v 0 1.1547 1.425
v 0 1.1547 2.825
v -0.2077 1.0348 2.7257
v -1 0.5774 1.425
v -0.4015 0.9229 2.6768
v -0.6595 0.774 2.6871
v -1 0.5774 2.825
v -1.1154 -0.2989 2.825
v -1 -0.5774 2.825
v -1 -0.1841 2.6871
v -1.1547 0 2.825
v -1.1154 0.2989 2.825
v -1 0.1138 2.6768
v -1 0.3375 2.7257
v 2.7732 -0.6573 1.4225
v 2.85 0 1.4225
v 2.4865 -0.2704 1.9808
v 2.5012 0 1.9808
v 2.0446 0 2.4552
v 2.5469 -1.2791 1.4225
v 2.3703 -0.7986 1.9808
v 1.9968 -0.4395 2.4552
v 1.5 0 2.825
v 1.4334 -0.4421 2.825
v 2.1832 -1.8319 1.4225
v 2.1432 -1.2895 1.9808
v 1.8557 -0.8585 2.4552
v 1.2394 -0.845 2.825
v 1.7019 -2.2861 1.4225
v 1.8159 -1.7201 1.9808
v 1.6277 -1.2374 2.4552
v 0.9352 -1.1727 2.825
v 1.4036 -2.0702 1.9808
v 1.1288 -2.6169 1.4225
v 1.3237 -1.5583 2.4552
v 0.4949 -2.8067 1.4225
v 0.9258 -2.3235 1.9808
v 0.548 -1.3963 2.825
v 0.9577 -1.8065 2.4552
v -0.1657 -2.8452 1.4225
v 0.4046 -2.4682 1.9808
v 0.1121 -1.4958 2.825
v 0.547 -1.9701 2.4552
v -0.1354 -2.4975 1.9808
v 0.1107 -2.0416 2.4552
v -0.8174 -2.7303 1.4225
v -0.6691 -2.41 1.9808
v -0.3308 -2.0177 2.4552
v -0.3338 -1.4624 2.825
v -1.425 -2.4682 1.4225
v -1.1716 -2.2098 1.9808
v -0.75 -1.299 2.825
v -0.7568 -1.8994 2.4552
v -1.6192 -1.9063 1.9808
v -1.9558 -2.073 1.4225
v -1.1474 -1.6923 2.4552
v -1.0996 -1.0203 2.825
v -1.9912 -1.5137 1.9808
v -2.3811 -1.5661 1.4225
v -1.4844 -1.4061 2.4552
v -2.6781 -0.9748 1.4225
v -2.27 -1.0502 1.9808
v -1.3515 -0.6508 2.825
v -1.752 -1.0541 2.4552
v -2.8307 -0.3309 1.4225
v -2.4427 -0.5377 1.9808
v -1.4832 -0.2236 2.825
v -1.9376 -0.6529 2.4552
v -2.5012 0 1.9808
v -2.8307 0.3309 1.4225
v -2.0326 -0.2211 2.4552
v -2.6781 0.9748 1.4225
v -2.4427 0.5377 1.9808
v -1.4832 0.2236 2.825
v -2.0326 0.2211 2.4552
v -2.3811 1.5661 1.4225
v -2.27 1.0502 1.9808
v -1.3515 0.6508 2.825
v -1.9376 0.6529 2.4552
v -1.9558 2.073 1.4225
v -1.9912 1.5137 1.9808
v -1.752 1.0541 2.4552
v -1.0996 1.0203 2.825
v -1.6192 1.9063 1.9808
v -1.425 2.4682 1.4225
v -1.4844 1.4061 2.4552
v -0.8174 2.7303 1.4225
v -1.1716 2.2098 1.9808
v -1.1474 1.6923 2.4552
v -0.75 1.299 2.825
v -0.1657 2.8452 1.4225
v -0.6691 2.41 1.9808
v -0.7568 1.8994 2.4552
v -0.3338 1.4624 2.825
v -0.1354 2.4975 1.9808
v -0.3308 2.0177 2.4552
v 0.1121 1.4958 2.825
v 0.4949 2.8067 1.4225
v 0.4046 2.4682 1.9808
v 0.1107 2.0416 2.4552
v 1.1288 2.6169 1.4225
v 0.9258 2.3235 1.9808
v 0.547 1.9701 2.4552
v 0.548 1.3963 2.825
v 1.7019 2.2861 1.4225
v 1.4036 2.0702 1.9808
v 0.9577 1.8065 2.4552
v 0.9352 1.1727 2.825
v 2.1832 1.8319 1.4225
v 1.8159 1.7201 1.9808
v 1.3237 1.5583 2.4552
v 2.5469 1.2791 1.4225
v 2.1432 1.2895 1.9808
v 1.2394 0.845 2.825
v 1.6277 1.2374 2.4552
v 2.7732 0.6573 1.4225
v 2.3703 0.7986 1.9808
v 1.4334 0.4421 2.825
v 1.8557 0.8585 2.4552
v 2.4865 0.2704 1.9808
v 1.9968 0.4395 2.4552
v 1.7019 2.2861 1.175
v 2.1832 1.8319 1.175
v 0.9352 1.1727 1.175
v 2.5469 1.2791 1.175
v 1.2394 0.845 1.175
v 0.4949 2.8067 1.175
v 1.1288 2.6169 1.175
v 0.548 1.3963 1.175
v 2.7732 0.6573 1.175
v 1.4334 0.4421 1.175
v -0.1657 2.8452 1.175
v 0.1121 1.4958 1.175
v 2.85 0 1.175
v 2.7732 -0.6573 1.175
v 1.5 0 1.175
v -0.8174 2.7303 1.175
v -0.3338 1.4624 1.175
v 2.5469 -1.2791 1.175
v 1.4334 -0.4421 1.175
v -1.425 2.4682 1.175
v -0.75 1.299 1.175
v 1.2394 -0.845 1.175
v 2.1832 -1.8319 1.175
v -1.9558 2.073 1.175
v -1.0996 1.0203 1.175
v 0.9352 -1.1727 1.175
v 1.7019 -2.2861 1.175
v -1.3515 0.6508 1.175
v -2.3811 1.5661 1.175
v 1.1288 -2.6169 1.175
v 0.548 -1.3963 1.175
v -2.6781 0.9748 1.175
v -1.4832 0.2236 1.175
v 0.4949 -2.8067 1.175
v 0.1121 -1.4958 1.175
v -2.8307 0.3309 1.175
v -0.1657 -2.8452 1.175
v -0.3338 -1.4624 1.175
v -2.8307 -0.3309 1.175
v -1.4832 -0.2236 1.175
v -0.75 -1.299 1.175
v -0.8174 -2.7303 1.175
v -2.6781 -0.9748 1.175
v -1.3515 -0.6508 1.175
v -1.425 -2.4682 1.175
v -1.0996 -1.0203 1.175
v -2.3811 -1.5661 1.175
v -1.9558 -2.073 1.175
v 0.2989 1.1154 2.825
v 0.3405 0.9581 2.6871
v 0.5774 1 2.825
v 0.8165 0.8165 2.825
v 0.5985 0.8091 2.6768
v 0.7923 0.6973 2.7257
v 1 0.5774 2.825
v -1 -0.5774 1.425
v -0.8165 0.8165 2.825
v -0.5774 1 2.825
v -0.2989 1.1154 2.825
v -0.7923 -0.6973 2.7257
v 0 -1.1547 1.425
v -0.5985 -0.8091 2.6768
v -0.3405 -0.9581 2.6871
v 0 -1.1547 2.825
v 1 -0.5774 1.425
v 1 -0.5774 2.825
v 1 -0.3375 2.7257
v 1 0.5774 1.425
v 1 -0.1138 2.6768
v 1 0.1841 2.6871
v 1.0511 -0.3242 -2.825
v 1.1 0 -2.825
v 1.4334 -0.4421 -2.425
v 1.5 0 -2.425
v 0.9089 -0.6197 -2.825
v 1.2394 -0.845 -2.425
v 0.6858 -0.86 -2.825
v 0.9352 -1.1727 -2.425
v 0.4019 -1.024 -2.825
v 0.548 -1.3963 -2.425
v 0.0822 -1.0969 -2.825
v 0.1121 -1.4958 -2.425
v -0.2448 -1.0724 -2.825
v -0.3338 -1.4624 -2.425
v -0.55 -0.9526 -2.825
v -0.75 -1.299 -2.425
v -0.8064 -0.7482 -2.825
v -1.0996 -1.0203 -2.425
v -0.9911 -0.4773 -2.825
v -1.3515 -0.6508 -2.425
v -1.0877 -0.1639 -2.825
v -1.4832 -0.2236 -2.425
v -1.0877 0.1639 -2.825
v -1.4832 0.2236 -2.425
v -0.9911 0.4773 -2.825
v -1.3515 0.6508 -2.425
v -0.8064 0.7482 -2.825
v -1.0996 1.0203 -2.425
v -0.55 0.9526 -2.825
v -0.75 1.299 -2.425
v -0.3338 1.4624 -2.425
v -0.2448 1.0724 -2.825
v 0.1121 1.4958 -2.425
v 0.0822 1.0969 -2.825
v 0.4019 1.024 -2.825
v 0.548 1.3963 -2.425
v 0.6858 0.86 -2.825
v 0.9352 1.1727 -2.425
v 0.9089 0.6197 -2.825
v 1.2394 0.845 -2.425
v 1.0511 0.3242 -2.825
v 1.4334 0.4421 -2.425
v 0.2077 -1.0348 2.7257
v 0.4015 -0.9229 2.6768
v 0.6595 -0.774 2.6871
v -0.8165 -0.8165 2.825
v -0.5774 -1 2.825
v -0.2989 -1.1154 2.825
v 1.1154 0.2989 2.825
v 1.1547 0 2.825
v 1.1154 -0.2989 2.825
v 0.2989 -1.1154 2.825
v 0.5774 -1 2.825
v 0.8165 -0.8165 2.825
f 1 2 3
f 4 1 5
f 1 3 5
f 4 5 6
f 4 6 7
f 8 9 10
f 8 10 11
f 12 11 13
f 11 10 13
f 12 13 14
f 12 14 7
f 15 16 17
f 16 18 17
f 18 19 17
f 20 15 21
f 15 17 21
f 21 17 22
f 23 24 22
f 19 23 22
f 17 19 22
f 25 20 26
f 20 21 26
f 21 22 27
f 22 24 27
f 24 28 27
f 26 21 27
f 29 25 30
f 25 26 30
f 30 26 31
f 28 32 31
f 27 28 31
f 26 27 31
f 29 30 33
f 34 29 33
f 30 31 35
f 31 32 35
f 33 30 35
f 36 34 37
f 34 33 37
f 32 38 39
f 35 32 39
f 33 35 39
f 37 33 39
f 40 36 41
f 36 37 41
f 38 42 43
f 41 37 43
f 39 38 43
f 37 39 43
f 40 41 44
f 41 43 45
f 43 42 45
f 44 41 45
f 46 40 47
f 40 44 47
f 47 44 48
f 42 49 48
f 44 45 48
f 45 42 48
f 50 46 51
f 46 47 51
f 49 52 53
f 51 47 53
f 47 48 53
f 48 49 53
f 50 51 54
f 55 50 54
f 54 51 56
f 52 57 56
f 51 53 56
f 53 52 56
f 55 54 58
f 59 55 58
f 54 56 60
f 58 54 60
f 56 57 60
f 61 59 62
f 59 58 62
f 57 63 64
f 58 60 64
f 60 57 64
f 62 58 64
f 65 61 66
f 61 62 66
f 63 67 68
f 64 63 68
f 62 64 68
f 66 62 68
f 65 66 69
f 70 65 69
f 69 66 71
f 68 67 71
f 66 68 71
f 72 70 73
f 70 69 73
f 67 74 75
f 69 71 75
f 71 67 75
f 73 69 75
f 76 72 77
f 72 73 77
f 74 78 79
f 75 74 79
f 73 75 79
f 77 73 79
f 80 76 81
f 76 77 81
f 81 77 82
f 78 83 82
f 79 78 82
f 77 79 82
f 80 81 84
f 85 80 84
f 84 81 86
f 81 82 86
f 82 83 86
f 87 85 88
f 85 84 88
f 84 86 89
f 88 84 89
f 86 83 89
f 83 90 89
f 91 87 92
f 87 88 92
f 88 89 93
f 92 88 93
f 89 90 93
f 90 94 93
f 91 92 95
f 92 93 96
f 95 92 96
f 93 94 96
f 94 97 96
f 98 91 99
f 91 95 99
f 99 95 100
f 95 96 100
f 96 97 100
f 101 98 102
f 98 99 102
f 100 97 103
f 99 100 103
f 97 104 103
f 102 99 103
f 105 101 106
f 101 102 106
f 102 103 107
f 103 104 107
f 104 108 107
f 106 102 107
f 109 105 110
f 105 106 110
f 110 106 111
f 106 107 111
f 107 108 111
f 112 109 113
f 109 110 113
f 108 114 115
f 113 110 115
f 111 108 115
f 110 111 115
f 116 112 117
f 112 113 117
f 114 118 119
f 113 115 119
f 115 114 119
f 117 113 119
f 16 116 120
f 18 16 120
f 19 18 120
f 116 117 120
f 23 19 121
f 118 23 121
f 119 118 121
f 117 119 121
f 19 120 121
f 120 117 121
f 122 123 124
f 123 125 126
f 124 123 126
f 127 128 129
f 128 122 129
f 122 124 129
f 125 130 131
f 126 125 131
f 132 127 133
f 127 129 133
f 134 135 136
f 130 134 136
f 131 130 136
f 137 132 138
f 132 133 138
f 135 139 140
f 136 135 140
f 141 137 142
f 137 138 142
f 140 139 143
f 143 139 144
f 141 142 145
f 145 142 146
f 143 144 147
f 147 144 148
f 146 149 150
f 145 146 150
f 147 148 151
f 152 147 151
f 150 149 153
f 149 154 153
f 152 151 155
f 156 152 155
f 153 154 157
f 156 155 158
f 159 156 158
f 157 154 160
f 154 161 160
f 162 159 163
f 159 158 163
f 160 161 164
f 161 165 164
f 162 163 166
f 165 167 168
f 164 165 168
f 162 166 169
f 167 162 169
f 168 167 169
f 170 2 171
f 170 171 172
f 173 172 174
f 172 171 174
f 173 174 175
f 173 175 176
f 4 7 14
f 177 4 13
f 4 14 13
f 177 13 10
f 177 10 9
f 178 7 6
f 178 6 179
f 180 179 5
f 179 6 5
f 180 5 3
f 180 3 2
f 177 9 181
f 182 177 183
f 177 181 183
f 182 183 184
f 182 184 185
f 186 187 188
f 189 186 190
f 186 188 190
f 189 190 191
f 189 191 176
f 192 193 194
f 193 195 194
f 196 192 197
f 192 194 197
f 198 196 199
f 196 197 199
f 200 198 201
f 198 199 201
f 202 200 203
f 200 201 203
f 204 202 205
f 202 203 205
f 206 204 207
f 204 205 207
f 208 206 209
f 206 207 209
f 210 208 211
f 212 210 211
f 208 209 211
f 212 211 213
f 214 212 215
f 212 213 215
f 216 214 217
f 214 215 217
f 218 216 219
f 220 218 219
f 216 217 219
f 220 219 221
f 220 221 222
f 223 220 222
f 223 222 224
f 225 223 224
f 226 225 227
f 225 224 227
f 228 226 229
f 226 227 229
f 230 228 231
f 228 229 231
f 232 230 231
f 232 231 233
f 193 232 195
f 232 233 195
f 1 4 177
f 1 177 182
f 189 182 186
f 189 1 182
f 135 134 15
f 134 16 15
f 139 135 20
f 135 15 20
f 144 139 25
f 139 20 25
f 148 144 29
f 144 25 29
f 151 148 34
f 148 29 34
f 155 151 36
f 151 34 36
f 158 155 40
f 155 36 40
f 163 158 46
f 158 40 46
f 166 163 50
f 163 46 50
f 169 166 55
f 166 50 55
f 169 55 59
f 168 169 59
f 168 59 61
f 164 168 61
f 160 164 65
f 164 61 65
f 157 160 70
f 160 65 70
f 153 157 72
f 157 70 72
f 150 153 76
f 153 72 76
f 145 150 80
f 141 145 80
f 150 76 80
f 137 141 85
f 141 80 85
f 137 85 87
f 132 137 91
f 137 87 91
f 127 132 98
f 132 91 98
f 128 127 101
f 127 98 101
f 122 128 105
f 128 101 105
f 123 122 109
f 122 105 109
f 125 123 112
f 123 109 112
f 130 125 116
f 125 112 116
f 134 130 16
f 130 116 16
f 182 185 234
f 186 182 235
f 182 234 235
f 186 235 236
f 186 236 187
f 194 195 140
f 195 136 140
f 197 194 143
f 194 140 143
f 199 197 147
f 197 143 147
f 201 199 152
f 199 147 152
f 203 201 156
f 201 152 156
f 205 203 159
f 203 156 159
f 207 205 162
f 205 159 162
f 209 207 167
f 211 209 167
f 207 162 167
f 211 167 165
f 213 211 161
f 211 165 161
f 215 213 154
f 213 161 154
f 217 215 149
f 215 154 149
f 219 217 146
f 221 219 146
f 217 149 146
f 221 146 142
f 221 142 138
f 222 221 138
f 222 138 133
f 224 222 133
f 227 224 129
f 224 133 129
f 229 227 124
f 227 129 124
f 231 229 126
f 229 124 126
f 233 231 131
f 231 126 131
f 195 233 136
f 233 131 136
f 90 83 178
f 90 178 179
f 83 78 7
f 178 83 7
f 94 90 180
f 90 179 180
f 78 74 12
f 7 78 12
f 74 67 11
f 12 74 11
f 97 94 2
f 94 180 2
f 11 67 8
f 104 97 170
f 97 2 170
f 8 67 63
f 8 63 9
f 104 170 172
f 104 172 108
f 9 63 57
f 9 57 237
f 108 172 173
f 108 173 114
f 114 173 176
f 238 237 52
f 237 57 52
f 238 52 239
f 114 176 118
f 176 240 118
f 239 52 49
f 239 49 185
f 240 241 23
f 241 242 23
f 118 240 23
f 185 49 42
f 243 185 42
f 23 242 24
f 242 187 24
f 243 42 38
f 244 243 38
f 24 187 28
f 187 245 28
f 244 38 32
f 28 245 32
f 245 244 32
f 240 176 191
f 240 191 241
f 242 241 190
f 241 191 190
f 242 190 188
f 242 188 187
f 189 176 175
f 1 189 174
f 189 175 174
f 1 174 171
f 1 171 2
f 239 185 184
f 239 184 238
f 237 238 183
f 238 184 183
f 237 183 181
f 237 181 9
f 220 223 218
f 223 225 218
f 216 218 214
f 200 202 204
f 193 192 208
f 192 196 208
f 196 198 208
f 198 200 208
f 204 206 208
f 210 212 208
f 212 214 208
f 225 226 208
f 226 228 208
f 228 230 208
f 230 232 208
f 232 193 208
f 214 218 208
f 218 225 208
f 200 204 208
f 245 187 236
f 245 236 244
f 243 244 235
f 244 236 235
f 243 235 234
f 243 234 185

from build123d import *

# Parameters (mm, degrees)
CUT_EXTRUDE1_DEPTH = 1.4


with BuildPart() as part:
    # Sketch2 → Revolve1 (revolve)
    with BuildSketch(Plane(origin=(0, 0, 0), x_dir=(0, 0, -1), z_dir=(1, 0, 0)), mode=Mode.PRIVATE) as revolve1_sk:
        with BuildLine():
            Line((-2.825, 0), (2.825, 0))
            Line((2.825, 0), (2.825, 1.1))
            Line((2.825, 1.1), (2.425, 1.5))
            Line((2.425, 1.5), (-1.175, 1.5))
            Line((-1.175, 1.5), (-1.175, 2.85))
            Line((-1.175, 2.85), (-1.4225, 2.85))
            ThreePointArc((-1.4225, 2.85), (-2.22987489, 2.285251969), (-2.825, 1.5))
            Line((-2.825, 1.5), (-2.825, 0))
        make_face()
    revolve(revolve1_sk.sketch.rotate(Axis((0, 0, 2.825), (0, 0, -1)), 90), axis=Axis((0, 0, 2.825), (0, 0, -1)))

    # Sketch3 → Cut-Extrude1 (cut)
    with BuildSketch(Plane.XY.offset(2.825)):
        Polygon((0, 1.154700538), (-1, 0.577350269), (-1, -0.577350269), (0, -1.154700538), (1, -0.577350269), (1, 0.577350269), align=None)
    extrude(amount=-CUT_EXTRUDE1_DEPTH, mode=Mode.SUBTRACT)

    # Cut-Extrude2 cone 1 section (through the dimple's axis) → Cut-Extrude2 (revolve, cut)
    with BuildSketch(Plane(origin=(0, 0, 2.825), x_dir=(0, -1, 0), z_dir=(1, 0, 0))):
        Polygon((0, 0), (1.154700538, 0), (0, 1.154700538), align=None)
    revolve(axis=Axis((0, 0, 2.825), (0, 0, -1)), mode=Mode.SUBTRACT)


solid = part.part
